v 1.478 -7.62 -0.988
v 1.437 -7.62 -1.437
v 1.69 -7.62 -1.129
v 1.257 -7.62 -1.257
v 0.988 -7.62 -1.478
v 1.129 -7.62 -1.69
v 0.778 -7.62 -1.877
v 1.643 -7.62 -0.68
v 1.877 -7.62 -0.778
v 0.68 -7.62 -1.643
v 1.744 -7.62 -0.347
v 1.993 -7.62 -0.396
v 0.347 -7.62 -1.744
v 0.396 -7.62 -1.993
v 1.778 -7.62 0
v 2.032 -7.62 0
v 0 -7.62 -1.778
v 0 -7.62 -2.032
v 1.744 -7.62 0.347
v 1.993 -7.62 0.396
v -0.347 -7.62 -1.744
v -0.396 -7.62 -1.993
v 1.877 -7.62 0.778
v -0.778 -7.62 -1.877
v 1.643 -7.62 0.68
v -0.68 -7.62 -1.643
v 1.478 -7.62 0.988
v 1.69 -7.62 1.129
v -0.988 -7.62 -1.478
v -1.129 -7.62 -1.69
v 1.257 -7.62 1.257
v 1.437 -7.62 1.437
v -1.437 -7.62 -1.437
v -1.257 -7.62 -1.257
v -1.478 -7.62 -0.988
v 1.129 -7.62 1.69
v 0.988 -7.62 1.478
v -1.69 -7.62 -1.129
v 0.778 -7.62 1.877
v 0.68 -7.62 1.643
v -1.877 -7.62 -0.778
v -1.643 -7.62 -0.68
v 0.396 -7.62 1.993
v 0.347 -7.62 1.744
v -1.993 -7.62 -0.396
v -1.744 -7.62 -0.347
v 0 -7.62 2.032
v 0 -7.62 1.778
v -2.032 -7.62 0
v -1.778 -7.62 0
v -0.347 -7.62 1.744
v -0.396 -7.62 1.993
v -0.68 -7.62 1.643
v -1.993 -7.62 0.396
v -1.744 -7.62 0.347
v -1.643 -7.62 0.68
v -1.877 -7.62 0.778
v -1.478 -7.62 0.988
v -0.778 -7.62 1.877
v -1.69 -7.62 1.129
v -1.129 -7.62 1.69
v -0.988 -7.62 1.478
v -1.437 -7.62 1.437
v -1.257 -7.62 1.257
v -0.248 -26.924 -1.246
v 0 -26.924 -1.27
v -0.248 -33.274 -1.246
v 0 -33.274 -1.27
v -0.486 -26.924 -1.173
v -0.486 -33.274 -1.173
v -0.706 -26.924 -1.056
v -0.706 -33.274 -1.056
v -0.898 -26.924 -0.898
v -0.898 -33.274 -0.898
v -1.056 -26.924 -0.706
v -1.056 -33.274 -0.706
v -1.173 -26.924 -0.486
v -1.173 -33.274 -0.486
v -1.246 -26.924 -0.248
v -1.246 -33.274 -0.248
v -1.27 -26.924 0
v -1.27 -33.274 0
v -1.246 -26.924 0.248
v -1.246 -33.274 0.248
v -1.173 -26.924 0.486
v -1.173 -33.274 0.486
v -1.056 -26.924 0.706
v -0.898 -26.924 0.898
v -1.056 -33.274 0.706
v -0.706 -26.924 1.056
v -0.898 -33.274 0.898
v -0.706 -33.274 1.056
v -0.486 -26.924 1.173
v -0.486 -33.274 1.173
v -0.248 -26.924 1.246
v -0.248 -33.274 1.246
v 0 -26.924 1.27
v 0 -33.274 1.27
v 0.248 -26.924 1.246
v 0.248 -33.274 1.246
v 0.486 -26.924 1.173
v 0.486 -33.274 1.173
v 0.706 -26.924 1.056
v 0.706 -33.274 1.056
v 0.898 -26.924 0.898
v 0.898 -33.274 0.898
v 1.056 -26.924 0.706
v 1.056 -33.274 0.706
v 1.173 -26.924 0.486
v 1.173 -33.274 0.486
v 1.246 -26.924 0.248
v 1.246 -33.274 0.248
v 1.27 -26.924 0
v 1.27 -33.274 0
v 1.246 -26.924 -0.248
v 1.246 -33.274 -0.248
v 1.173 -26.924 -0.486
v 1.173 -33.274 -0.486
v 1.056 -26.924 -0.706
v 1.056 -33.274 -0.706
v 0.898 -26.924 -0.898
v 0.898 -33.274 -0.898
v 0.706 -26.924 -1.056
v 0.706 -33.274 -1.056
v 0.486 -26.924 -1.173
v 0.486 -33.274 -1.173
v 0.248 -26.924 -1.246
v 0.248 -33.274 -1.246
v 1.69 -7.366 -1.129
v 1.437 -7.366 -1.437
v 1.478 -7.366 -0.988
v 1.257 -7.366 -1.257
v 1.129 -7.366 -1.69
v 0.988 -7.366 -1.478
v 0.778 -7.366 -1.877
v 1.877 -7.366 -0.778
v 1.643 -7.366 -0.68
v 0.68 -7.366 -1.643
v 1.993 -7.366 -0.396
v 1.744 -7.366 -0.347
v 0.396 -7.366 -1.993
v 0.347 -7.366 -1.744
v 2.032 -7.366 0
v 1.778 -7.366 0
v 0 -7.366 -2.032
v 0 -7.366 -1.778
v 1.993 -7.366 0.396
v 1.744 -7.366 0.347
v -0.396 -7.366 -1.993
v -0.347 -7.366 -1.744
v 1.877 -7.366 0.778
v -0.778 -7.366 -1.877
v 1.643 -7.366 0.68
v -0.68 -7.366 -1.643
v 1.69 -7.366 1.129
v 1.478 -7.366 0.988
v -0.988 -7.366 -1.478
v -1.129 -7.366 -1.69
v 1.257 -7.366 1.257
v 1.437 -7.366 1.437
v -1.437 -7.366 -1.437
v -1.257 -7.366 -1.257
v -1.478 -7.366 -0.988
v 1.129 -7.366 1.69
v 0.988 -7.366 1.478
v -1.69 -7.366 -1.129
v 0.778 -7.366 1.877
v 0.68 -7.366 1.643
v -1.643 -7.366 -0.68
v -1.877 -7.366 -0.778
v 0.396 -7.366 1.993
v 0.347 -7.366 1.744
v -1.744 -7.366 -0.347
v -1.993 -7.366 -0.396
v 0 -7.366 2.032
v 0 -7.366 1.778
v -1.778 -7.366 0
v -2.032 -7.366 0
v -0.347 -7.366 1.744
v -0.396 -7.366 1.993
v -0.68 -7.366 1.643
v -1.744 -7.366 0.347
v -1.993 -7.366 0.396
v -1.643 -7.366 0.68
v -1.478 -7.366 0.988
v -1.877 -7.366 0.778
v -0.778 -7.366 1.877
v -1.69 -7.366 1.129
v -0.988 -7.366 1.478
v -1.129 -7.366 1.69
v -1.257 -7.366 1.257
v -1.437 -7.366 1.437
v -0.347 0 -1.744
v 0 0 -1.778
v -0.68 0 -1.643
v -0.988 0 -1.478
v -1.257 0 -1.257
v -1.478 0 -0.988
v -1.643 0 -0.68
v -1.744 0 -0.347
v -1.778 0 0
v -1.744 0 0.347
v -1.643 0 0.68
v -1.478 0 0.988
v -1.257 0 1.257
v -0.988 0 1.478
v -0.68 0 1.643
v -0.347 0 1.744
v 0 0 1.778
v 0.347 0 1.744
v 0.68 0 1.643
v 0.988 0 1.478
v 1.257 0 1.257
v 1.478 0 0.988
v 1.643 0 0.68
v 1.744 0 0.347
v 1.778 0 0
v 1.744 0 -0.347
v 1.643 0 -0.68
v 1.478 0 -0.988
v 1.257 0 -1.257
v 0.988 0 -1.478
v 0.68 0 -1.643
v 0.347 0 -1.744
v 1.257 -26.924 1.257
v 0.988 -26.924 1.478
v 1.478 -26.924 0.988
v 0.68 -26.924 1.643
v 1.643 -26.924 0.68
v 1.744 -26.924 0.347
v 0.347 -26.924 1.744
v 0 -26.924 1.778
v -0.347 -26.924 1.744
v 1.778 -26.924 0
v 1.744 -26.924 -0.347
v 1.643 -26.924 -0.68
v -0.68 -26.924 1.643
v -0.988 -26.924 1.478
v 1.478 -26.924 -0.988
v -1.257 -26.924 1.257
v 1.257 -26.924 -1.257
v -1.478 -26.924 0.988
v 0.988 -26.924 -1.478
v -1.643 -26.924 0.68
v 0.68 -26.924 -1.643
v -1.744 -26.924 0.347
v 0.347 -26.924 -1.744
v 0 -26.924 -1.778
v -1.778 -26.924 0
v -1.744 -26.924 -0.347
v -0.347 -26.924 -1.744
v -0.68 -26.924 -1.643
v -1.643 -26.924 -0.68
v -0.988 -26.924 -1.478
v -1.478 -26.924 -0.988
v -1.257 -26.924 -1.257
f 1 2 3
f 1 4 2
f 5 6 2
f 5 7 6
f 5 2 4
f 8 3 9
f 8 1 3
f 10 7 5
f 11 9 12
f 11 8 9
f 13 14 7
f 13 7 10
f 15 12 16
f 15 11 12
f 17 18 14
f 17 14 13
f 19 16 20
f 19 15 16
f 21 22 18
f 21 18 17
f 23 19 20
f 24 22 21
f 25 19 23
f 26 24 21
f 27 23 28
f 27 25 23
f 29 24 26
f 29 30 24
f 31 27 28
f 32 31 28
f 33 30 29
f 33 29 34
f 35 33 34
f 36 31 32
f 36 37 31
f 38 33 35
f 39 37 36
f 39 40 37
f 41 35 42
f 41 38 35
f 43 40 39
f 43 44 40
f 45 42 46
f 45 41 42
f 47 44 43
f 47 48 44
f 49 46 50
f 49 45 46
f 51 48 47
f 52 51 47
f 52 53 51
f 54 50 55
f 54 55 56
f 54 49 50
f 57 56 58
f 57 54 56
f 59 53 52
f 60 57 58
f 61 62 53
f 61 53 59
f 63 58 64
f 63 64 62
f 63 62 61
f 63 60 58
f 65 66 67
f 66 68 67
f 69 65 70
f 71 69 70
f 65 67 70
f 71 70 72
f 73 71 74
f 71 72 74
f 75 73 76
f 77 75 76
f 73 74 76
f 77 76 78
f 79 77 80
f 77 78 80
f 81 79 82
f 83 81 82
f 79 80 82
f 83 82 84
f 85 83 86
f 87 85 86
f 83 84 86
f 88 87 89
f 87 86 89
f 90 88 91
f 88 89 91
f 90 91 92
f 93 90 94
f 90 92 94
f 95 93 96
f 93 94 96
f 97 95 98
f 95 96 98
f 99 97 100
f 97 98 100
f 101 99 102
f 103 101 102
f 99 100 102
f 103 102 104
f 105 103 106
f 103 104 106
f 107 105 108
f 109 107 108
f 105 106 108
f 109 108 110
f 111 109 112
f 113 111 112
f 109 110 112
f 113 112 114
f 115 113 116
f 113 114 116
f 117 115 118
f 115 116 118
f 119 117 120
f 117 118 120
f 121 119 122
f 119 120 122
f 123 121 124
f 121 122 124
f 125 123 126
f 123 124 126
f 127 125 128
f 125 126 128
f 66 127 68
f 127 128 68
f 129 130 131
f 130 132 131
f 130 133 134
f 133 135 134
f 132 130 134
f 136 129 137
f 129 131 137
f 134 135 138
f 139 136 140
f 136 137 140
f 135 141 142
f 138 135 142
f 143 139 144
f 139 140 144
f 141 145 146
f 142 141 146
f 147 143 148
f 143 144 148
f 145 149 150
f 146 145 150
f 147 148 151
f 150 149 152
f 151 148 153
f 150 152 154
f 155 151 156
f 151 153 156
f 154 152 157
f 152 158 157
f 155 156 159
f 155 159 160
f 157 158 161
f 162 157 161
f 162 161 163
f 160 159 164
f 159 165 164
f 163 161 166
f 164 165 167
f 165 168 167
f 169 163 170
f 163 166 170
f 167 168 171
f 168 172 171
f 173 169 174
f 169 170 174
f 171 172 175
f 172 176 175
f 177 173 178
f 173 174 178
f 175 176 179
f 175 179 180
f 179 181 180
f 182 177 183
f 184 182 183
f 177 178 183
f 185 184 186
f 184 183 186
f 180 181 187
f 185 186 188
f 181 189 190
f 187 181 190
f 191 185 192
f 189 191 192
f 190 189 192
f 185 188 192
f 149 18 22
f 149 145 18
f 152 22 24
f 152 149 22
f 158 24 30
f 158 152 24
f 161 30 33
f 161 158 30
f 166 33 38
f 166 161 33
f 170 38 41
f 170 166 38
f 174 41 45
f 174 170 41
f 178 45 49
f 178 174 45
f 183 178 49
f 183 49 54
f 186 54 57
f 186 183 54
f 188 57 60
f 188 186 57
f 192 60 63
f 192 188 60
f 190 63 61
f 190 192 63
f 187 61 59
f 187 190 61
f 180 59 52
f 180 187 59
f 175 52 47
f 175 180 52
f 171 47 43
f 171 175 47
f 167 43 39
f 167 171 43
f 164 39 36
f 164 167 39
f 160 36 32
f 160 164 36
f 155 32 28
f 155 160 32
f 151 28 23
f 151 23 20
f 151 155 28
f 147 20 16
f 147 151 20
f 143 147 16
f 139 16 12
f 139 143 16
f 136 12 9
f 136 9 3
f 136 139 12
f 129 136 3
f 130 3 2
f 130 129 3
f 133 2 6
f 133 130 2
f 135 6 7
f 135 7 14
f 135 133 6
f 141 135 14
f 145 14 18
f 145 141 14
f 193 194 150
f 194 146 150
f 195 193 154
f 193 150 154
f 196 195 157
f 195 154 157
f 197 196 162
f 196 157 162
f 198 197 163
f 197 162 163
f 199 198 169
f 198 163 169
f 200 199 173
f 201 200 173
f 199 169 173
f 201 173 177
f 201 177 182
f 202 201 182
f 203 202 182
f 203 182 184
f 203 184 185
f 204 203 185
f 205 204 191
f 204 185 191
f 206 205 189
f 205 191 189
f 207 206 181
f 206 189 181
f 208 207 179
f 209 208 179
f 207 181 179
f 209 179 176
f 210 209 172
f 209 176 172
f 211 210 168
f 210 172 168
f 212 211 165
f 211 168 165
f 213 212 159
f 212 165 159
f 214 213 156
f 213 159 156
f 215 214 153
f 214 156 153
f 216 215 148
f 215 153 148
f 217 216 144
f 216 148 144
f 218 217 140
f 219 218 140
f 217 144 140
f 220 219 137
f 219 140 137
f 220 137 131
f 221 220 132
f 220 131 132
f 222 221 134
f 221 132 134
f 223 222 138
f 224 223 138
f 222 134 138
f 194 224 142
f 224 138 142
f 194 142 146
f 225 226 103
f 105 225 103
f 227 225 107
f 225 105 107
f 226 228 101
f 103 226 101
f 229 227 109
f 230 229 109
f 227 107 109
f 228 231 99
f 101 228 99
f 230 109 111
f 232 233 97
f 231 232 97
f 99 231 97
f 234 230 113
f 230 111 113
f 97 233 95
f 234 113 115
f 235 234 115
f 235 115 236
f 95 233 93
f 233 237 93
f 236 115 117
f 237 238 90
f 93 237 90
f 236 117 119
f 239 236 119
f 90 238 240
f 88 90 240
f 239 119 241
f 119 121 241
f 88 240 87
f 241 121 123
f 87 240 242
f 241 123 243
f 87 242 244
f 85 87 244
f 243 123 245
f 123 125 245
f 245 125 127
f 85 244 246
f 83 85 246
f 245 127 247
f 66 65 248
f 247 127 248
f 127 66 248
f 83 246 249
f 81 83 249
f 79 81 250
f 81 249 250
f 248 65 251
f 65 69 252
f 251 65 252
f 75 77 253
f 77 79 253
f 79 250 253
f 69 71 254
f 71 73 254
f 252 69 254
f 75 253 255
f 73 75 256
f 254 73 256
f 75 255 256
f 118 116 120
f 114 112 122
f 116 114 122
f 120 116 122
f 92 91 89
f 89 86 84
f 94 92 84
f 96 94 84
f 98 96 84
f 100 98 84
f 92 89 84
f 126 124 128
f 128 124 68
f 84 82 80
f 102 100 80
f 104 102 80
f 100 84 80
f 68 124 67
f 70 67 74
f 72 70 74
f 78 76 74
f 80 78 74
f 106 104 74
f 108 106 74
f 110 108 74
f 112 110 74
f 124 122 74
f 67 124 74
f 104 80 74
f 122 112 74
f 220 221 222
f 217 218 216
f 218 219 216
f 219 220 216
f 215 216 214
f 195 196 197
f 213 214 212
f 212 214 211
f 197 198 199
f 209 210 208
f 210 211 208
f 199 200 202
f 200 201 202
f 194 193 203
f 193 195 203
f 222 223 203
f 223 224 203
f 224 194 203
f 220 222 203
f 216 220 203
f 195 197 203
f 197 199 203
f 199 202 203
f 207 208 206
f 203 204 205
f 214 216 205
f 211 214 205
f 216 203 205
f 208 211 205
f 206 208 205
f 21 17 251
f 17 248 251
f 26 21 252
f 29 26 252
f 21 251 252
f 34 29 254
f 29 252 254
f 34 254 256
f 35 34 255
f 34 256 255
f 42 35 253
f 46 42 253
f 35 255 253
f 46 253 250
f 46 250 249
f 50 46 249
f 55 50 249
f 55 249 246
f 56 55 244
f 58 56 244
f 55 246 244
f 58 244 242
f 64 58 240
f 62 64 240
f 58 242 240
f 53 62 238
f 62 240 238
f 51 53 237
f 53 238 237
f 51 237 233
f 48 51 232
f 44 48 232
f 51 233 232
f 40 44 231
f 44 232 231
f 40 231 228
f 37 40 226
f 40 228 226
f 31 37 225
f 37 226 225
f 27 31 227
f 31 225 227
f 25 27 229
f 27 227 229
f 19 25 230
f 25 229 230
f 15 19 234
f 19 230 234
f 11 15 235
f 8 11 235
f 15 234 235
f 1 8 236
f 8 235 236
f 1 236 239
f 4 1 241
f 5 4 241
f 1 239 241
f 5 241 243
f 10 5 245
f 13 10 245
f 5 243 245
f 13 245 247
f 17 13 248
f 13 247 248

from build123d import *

# Parameters (mm, degrees)
SKETCH1_W = 0.254
SKETCH1_H = 0.254


with BuildPart() as part:
    # Sketch1 → Revolve2 (revolve)
    with BuildSketch(Plane.XY, mode=Mode.PRIVATE) as revolve2_sk:
        Polygon((0, -33.274), (0, 0), (1.778, 0), (1.778, -26.924), (1.27, -26.924), (1.27, -33.274), align=None)
        with Locations((1.905, -7.493)):
            Rectangle(SKETCH1_W, SKETCH1_H)
    revolve(revolve2_sk.sketch.rotate(Axis((0, 0, 0), (0, 1, 0)), 90), axis=Axis((0, 0, 0), (0, 1, 0)))


solid = part.part
